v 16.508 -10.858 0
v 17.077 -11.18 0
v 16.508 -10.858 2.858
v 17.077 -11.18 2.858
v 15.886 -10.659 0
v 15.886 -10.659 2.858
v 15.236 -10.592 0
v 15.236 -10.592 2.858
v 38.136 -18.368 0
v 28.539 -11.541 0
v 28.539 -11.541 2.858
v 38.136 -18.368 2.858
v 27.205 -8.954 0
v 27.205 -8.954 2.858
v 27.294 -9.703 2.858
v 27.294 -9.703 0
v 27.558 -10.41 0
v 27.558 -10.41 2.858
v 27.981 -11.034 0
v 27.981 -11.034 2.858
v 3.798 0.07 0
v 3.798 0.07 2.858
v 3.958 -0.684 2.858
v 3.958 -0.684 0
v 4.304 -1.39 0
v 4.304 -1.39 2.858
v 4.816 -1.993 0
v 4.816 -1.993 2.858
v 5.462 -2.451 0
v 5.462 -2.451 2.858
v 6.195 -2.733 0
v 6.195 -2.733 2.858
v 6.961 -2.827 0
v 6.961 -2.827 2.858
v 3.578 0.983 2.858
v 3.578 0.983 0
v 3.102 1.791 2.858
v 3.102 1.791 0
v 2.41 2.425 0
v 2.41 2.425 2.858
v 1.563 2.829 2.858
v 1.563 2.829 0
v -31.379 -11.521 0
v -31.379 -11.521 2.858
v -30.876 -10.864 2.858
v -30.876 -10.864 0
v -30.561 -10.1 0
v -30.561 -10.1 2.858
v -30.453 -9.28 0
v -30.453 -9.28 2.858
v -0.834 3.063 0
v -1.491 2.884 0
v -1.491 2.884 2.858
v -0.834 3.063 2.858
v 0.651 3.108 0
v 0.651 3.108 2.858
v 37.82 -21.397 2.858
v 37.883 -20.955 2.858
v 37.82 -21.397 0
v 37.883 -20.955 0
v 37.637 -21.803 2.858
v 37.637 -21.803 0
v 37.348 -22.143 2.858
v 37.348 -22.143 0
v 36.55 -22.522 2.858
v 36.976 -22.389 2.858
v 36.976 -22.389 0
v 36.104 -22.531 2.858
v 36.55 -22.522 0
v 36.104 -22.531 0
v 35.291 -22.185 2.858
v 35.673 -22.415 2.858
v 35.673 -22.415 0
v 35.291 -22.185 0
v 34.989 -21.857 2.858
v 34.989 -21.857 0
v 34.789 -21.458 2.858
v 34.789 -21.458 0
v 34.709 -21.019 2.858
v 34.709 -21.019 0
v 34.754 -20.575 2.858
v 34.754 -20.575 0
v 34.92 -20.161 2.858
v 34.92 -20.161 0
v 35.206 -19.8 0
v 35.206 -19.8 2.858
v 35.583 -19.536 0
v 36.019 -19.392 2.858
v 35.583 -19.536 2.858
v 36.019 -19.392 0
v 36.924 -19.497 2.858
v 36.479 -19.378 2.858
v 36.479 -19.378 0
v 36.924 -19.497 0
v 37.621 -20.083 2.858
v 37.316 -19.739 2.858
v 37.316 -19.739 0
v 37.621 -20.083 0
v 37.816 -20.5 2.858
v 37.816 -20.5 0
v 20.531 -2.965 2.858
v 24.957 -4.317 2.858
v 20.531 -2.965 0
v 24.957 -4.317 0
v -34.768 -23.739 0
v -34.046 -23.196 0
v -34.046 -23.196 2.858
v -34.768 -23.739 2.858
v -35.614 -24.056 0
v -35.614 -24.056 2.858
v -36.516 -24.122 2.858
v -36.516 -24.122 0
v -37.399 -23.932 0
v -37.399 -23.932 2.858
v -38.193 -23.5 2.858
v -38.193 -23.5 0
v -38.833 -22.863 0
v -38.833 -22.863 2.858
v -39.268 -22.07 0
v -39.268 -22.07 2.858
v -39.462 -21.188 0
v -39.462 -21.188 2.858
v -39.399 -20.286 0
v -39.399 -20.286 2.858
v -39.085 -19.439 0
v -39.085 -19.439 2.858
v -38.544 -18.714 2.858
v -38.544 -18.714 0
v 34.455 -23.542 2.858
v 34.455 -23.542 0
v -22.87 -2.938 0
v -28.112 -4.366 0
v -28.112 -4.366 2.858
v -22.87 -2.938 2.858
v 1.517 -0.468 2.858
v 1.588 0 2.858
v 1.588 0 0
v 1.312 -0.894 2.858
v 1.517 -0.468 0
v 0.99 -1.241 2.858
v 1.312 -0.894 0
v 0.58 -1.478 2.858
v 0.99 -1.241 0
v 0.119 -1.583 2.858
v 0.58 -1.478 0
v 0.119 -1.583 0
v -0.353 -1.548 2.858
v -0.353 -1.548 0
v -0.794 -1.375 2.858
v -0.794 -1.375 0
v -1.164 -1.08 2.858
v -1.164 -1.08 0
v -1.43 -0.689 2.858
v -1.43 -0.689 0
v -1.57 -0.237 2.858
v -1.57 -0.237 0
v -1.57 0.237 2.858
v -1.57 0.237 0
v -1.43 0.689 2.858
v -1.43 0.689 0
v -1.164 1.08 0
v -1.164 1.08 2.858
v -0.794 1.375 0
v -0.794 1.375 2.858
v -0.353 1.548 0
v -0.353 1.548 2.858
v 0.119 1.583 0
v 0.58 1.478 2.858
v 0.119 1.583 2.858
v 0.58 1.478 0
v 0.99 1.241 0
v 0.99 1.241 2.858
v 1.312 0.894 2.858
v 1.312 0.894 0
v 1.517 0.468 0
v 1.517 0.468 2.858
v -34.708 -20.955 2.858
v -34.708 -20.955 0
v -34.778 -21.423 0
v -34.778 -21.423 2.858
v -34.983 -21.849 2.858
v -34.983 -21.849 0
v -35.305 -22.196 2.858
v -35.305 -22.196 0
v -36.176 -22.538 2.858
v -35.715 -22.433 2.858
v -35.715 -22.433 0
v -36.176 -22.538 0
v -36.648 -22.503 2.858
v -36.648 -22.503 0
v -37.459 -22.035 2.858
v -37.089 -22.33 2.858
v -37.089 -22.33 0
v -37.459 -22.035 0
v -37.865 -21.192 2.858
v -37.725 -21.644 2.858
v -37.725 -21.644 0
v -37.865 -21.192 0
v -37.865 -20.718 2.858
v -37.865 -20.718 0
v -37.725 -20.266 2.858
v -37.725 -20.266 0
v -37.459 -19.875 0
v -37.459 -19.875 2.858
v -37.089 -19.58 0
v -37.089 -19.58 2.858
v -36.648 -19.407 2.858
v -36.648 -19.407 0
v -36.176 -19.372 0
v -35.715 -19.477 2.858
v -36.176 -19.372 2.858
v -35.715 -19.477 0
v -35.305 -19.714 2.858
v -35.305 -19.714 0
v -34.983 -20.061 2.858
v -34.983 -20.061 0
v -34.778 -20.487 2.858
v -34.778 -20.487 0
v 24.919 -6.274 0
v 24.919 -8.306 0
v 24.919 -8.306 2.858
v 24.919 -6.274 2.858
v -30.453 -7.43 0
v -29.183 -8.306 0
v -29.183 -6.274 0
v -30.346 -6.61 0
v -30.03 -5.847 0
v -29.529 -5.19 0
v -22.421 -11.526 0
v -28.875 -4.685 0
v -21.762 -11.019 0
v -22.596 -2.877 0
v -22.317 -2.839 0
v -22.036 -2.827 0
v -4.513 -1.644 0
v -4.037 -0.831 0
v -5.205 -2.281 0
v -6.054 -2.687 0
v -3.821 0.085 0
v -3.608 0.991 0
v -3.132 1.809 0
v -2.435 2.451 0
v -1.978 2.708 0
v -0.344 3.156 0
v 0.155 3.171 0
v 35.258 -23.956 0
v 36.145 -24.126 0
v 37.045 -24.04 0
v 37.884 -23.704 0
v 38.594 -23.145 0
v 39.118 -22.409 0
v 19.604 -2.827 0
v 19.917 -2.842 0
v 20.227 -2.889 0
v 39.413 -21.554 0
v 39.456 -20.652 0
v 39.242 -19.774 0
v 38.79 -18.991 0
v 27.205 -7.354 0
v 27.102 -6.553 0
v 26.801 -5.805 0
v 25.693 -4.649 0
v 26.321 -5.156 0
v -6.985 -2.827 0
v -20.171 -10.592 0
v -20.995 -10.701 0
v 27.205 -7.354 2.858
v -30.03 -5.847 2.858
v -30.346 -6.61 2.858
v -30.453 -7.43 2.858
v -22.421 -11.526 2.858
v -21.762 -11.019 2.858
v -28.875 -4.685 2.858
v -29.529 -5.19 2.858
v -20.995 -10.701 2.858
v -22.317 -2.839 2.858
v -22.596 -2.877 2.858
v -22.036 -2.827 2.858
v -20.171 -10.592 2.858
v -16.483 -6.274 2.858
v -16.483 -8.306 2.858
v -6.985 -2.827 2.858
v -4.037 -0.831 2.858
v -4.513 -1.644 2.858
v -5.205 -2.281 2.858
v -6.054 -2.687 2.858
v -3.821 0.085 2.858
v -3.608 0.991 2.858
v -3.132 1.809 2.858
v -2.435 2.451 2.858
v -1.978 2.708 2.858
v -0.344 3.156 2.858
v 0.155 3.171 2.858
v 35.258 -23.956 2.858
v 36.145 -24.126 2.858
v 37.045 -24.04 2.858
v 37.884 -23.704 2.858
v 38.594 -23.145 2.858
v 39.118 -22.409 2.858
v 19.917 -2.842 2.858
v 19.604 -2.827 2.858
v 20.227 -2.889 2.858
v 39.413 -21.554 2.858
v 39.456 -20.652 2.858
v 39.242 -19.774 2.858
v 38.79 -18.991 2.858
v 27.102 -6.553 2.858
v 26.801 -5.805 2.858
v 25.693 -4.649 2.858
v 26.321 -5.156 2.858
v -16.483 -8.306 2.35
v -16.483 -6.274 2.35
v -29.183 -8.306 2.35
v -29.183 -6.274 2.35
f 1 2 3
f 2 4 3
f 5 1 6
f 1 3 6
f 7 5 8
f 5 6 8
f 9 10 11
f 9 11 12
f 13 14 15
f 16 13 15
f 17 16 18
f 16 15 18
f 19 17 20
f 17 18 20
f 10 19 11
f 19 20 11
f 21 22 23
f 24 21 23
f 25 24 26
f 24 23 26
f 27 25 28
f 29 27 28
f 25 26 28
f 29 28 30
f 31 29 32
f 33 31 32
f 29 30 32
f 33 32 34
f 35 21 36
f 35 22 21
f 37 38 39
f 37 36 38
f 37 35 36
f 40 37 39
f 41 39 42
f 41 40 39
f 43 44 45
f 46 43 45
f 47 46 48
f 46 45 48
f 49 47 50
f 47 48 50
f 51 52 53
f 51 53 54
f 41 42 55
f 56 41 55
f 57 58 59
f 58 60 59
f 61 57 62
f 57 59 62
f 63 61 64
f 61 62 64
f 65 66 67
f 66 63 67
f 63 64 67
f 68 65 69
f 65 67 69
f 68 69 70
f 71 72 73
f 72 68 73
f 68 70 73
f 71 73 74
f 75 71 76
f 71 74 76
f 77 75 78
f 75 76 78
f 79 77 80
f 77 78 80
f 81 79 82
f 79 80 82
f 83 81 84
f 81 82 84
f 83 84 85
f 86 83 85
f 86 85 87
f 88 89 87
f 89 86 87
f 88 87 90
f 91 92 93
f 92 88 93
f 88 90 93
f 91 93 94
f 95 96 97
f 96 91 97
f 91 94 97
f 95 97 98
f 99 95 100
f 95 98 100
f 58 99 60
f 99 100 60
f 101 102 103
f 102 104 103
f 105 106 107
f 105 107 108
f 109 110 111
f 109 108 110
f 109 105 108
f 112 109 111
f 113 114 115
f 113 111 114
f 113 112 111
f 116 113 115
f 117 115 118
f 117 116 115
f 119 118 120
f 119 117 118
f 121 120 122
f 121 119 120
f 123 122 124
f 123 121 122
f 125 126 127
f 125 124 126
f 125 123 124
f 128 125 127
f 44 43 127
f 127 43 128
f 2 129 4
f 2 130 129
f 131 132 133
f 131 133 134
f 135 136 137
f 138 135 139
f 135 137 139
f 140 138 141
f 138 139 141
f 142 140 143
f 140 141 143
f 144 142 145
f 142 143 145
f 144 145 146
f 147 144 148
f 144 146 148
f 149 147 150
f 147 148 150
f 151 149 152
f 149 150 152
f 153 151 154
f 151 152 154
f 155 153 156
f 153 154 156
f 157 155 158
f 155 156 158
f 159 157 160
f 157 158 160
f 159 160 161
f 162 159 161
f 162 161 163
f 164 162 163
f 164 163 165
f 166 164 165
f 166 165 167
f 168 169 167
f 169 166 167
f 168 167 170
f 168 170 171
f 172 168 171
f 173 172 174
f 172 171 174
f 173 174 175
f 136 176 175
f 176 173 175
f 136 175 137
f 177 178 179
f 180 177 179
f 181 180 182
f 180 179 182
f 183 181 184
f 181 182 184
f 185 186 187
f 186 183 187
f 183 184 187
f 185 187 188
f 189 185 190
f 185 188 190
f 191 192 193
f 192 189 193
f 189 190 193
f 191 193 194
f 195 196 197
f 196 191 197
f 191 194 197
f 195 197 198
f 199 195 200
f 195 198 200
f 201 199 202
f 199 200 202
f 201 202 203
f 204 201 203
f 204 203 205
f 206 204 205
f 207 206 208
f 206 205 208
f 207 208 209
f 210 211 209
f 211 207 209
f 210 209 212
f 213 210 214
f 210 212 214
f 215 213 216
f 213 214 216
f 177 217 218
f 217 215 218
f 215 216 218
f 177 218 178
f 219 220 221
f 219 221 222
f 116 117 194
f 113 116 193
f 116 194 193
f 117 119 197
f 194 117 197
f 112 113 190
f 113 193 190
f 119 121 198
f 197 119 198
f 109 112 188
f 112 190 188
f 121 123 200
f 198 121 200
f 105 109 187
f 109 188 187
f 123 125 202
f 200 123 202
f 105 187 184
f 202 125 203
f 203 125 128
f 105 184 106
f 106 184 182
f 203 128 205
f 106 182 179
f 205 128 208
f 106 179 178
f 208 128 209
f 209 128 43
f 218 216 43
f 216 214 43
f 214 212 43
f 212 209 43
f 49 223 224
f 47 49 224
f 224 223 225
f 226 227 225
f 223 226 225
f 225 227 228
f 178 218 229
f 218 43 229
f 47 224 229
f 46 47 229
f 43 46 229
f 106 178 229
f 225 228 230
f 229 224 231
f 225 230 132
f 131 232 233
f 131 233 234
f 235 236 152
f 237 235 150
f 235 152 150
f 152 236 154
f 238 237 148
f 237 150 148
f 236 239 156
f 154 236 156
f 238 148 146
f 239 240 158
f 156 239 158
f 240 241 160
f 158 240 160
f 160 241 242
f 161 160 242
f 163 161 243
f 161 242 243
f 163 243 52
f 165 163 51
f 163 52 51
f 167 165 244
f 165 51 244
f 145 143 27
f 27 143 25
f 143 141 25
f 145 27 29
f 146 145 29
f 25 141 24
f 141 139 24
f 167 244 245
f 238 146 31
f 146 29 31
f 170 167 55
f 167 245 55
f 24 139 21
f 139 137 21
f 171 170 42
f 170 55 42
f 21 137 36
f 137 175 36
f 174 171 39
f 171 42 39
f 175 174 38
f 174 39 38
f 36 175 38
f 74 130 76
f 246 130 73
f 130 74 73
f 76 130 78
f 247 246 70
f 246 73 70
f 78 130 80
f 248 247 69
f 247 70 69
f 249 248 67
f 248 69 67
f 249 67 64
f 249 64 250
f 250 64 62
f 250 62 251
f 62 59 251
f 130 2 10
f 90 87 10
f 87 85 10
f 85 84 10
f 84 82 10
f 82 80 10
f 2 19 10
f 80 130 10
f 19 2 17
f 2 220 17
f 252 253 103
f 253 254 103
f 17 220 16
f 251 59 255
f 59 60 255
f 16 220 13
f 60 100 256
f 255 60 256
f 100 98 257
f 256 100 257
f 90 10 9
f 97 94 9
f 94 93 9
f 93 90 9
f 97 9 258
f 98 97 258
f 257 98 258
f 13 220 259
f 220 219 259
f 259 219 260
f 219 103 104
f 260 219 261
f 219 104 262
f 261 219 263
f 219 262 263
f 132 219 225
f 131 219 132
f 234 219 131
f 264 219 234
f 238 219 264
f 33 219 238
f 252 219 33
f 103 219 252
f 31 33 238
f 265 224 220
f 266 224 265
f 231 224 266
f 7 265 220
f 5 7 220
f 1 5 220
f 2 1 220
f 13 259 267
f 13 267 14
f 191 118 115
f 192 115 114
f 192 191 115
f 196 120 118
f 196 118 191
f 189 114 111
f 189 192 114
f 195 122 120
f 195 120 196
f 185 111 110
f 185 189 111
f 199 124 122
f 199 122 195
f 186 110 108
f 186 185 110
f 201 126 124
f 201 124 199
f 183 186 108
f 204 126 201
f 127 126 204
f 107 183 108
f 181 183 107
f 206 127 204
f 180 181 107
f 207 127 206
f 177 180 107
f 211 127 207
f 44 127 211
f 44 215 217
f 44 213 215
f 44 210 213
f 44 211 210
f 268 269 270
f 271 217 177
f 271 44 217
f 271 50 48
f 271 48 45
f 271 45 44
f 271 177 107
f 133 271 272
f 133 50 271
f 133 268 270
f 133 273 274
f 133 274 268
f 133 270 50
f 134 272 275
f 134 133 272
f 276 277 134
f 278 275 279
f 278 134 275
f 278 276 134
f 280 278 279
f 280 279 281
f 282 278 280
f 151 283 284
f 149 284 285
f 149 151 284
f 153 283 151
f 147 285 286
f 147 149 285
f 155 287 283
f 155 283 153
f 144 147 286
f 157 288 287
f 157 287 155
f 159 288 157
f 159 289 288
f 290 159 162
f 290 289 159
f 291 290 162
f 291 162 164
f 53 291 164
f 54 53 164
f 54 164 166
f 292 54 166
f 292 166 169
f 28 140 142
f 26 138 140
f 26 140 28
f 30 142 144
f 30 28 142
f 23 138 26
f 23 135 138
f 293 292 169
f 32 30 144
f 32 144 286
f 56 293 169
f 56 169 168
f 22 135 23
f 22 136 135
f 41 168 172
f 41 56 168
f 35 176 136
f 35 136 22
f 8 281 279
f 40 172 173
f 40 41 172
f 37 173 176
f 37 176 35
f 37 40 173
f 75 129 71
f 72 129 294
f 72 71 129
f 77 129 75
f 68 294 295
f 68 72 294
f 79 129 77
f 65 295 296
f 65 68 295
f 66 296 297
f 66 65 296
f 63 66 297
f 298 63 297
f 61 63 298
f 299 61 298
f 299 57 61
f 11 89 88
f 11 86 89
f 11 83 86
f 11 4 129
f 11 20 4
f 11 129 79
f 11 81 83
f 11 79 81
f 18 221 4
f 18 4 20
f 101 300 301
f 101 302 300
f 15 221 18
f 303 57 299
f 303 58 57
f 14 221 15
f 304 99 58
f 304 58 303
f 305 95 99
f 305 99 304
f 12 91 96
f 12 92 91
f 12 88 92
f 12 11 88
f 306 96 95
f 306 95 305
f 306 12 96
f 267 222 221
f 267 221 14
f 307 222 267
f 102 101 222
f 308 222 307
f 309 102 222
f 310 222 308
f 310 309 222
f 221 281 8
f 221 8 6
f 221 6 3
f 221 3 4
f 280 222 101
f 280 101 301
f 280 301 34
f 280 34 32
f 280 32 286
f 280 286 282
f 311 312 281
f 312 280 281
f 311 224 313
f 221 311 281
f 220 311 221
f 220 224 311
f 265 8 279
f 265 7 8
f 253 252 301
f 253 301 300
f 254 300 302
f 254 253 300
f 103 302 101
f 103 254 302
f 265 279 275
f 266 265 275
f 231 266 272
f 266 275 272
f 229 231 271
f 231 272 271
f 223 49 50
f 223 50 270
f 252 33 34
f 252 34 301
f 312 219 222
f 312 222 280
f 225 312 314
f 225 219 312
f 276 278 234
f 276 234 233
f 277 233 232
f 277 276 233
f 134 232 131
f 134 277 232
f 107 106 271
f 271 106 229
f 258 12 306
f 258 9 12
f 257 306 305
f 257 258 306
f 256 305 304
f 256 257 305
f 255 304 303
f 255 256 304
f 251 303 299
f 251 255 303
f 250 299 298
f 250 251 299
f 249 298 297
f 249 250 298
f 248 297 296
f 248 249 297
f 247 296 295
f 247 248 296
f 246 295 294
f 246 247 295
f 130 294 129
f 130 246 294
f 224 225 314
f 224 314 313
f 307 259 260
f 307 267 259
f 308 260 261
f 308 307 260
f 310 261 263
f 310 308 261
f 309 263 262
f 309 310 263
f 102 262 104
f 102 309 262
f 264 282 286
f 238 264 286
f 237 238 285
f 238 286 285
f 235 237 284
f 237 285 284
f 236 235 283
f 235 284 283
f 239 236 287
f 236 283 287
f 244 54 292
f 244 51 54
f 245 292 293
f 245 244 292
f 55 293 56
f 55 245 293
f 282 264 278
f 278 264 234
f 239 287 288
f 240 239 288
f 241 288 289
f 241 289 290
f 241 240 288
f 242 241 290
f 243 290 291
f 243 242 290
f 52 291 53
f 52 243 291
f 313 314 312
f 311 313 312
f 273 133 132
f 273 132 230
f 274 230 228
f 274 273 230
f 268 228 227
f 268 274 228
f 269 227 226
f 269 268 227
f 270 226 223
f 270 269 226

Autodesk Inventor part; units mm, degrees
ref_plane "YZ Plane" through (0, 0, 0) normal (1, 0, 0) x (0, 1, 0)
ref_plane "XZ Plane" through (0, 0, 0) normal (0, 1, 0) x (-1, 0, 0)
ref_plane "XY Plane" through (0, 0, 0) normal (0, 0, 1) x (1, 0, 0)
sketch "Sketch1" plane through (0, 0, 0) normal (0, 0, 1) x (1, 0, 0)
  circle A0 centre (0, 0) radius 1.5875
  circle A1 centre (0, 0) radius 3.175
  line L0 (0, 0) -> (36.2951, -20.955)
  line L1 (0, 0) -> (41.91, 0) construction
  circle A2 centre (36.2951, -20.955) radius 1.5875
  circle A3 centre (36.2951, -20.955) radius 3.175
  line L2 (0, 0) -> (0, 8.5417)
  circle A4 centre (-36.2951, -20.955) radius 1.5875
  circle A5 centre (-36.2951, -20.955) radius 3.175
  line L3 (-29.1831, -8.3058) -> (24.9189, -8.3058)
  line L4 (24.9189, -8.3058) -> (24.9189, -6.2738)
  line L5 (24.9189, -6.2738) -> (-29.1831, -6.2738)
  line L6 (-29.1831, -6.2738) -> (-29.1831, -8.3058)
  line L7 (-16.4831, -6.2738) -> (-16.4831, -8.3058)
  line L8 (-30.4531, -5.0038) -> (27.2049, -5.0038)
  line L9 (27.2049, -5.0038) -> (27.2049, -10.5918)
  line L10 (27.2049, -10.5918) -> (-30.4531, -10.5918)
  line L11 (-30.4531, -10.5918) -> (-30.4531, -5.0038)
  line L12 (-30.4531, -5.0038) -> (-0.8344, 3.0634)
  line L13 (-30.4531, -10.5918) -> (-38.5445, -18.7142)
  line L14 (27.2049, -5.0038) -> (0.6506, 3.1076)
  line L15 (27.2049, -10.5918) -> (38.1356, -18.3679)
  line L16 (34.4546, -23.5421) -> (16.2505, -10.5918)
  line L17 (-34.0458, -23.1958) -> (-21.49, -10.5918)
  dimension "d0" = 3.175
  dimension "d1" = 6.35
  dimension "d2" = 41.91
  dimension "d3" = 30
  dimension "d4" = 3.175
  dimension "d5" = 6.35
  dimension "d6" = 7.112
  dimension "d7" = 12.6492
  dimension "d8" = 54.102
  dimension "d9" = 41.402
  dimension "d10" = 1.27
  dimension "d11" = 2.286
  dimension "d12" = 1.27
  dimension "d13" = 2.286
  dimension "d16" = 2.032
extrude "Extrusion1" add sketch "Sketch1" along normal blind 2.8575 contours A0 L2 A1 L14 L0 | A0 L0 A1 L2 | L0 L8 L12 A1 | A1 L14 L8 L0 | L8 L9 L10 L0 L3 L4 L5 | L0 L5 L6 L3 L10 L11 L8 | L10 L17 A5 L13 | L15 A3 L0 L10 | A5 | L0 A3 L16 L10 | A3
fillet "Fillet1" radius 3.175 6 edges at (27.2049, -10.5918, 1.4287) (27.2049, -5.0038, 1.4287) (-30.4531, -5.0038, 1.4287) (-30.4531, -10.5918, 1.4287) (-21.49, -10.5918, 1.4287) (16.2505, -10.5918, 1.4287)
sketch "Sketch4" plane through (0, 0, 0) normal (0, 0, -1) x (-1, 0, 0)
  arc A0 (30.4531, -7.4297) -> (28.1125, -4.3663) centre (27.2781, -7.4297) ccw projected
  line L0 (0.8344, 3.0634) -> (28.1125, -4.3663) projected
  arc A1 (0.8344, 3.0634) -> (-0.6506, 3.1076) centre (0, 0) ccw projected
  line L1 (-24.9574, -4.3173) -> (-0.6506, 3.1076) projected
  arc A2 (-24.9574, -4.3173) -> (-27.2049, -7.3538) centre (-24.0299, -7.3538) ccw projected
  line L2 (-27.2049, -8.954) -> (-27.2049, -7.3538) projected
  arc A3 (-28.5394, -11.5412) -> (-27.2049, -8.954) centre (-30.3799, -8.954) ccw projected
  line L3 (-38.1356, -18.3679) -> (-28.5394, -11.5412) projected
  arc A4 (-38.1356, -18.3679) -> (-34.4546, -23.5421) centre (-36.2951, -20.955) ccw projected
  line L4 (-17.0769, -11.1797) -> (-34.4546, -23.5421) projected
  arc A5 (-15.2364, -10.5918) -> (-17.0769, -11.1797) centre (-15.2364, -13.7668) ccw projected
  line L5 (20.1713, -10.5918) -> (-15.2364, -10.5918) projected
  arc A6 (22.4207, -11.526) -> (20.1713, -10.5918) centre (20.1713, -13.7668) ccw projected
  line L6 (34.0458, -23.1958) -> (22.4207, -11.526) projected
  arc A7 (34.0458, -23.1958) -> (38.5445, -18.7142) centre (36.2951, -20.955) ccw projected
  line L7 (31.3788, -11.521) -> (38.5445, -18.7142) projected
  arc A8 (30.4531, -9.2802) -> (31.3788, -11.521) centre (33.6281, -9.2802) ccw projected
  line L8 (30.4531, -7.4297) -> (30.4531, -9.2802) projected
  circle A9 centre (36.2951, -20.955) radius 1.5875 projected
  line L9 (29.1831, -8.3058) -> (-24.9189, -8.3058) projected
  line L10 (-24.9189, -8.3058) -> (-24.9189, -6.2738) projected
  line L11 (-24.9189, -6.2738) -> (29.1831, -6.2738) projected
  line L12 (29.1831, -6.2738) -> (29.1831, -8.3058) projected
  circle A10 centre (0, 0) radius 1.5875 projected
  circle A11 centre (-36.2951, -20.955) radius 1.5875 projected
  line L13 (-23.2186, 2.3851) -> (-3.81, 2.3851)
  line L14 (-3.81, 2.3851) -> (-3.81, -2.8268)
  line L15 (-3.81, -2.8268) -> (-23.2186, -2.8268)
  line L16 (-23.2186, -2.8268) -> (-23.2186, 2.3851)
  line L17 (23.7839, 2.3851) -> (3.81, 2.3851)
  line L18 (3.81, 2.3851) -> (3.81, -2.8268)
  line L19 (3.81, -2.8268) -> (23.7839, -2.8268)
  line L20 (23.7839, -2.8268) -> (23.7839, 2.3851)
  dimension "d23" = 3.81
  dimension "d24" = 3.81
extrude "Extrusion3" cut sketch "Sketch4" against normal through all contours L19 L18 L0 | L0 L18 L17 L20 L19 | L14 L15 L1 | L1 L15 L16 L13 L14
fillet "Fillet2" radius 3.175 6 edges at (3.81, 2.1425, 1.4287) (3.81, -2.8268, 1.4287) (-3.81, -2.8268, 1.4287) (-3.81, 2.2529, 1.4287) (20.0782, -2.8268, 1.4287) (-22.4604, -2.8268, 1.4287)
sketch "Sketch7" plane through (0, 0, 2.8575) normal (0, 0, 1) x (1, 0, 0)
  line L0 (-16.4831, -6.2738) -> (-16.4831, -8.3058) projected
  line L1 (-29.1831, -8.3058) -> (-29.1831, -6.2738) projected
  line L2 (-16.4831, -8.3058) -> (-29.1831, -8.3058)
  line L3 (-29.1831, -8.3058) -> (-29.1831, -6.2738)
  line L4 (-29.1831, -6.2738) -> (-16.4831, -6.2738)
  line L5 (-16.4831, -6.2738) -> (-16.4831, -8.3058)
  point P0 (0, 0)
extrude "Extrusion5" add sketch "Sketch7" against normal blind 0.508
properties part number "ArduinoMegaHolder1" material "ABS Plastic"
